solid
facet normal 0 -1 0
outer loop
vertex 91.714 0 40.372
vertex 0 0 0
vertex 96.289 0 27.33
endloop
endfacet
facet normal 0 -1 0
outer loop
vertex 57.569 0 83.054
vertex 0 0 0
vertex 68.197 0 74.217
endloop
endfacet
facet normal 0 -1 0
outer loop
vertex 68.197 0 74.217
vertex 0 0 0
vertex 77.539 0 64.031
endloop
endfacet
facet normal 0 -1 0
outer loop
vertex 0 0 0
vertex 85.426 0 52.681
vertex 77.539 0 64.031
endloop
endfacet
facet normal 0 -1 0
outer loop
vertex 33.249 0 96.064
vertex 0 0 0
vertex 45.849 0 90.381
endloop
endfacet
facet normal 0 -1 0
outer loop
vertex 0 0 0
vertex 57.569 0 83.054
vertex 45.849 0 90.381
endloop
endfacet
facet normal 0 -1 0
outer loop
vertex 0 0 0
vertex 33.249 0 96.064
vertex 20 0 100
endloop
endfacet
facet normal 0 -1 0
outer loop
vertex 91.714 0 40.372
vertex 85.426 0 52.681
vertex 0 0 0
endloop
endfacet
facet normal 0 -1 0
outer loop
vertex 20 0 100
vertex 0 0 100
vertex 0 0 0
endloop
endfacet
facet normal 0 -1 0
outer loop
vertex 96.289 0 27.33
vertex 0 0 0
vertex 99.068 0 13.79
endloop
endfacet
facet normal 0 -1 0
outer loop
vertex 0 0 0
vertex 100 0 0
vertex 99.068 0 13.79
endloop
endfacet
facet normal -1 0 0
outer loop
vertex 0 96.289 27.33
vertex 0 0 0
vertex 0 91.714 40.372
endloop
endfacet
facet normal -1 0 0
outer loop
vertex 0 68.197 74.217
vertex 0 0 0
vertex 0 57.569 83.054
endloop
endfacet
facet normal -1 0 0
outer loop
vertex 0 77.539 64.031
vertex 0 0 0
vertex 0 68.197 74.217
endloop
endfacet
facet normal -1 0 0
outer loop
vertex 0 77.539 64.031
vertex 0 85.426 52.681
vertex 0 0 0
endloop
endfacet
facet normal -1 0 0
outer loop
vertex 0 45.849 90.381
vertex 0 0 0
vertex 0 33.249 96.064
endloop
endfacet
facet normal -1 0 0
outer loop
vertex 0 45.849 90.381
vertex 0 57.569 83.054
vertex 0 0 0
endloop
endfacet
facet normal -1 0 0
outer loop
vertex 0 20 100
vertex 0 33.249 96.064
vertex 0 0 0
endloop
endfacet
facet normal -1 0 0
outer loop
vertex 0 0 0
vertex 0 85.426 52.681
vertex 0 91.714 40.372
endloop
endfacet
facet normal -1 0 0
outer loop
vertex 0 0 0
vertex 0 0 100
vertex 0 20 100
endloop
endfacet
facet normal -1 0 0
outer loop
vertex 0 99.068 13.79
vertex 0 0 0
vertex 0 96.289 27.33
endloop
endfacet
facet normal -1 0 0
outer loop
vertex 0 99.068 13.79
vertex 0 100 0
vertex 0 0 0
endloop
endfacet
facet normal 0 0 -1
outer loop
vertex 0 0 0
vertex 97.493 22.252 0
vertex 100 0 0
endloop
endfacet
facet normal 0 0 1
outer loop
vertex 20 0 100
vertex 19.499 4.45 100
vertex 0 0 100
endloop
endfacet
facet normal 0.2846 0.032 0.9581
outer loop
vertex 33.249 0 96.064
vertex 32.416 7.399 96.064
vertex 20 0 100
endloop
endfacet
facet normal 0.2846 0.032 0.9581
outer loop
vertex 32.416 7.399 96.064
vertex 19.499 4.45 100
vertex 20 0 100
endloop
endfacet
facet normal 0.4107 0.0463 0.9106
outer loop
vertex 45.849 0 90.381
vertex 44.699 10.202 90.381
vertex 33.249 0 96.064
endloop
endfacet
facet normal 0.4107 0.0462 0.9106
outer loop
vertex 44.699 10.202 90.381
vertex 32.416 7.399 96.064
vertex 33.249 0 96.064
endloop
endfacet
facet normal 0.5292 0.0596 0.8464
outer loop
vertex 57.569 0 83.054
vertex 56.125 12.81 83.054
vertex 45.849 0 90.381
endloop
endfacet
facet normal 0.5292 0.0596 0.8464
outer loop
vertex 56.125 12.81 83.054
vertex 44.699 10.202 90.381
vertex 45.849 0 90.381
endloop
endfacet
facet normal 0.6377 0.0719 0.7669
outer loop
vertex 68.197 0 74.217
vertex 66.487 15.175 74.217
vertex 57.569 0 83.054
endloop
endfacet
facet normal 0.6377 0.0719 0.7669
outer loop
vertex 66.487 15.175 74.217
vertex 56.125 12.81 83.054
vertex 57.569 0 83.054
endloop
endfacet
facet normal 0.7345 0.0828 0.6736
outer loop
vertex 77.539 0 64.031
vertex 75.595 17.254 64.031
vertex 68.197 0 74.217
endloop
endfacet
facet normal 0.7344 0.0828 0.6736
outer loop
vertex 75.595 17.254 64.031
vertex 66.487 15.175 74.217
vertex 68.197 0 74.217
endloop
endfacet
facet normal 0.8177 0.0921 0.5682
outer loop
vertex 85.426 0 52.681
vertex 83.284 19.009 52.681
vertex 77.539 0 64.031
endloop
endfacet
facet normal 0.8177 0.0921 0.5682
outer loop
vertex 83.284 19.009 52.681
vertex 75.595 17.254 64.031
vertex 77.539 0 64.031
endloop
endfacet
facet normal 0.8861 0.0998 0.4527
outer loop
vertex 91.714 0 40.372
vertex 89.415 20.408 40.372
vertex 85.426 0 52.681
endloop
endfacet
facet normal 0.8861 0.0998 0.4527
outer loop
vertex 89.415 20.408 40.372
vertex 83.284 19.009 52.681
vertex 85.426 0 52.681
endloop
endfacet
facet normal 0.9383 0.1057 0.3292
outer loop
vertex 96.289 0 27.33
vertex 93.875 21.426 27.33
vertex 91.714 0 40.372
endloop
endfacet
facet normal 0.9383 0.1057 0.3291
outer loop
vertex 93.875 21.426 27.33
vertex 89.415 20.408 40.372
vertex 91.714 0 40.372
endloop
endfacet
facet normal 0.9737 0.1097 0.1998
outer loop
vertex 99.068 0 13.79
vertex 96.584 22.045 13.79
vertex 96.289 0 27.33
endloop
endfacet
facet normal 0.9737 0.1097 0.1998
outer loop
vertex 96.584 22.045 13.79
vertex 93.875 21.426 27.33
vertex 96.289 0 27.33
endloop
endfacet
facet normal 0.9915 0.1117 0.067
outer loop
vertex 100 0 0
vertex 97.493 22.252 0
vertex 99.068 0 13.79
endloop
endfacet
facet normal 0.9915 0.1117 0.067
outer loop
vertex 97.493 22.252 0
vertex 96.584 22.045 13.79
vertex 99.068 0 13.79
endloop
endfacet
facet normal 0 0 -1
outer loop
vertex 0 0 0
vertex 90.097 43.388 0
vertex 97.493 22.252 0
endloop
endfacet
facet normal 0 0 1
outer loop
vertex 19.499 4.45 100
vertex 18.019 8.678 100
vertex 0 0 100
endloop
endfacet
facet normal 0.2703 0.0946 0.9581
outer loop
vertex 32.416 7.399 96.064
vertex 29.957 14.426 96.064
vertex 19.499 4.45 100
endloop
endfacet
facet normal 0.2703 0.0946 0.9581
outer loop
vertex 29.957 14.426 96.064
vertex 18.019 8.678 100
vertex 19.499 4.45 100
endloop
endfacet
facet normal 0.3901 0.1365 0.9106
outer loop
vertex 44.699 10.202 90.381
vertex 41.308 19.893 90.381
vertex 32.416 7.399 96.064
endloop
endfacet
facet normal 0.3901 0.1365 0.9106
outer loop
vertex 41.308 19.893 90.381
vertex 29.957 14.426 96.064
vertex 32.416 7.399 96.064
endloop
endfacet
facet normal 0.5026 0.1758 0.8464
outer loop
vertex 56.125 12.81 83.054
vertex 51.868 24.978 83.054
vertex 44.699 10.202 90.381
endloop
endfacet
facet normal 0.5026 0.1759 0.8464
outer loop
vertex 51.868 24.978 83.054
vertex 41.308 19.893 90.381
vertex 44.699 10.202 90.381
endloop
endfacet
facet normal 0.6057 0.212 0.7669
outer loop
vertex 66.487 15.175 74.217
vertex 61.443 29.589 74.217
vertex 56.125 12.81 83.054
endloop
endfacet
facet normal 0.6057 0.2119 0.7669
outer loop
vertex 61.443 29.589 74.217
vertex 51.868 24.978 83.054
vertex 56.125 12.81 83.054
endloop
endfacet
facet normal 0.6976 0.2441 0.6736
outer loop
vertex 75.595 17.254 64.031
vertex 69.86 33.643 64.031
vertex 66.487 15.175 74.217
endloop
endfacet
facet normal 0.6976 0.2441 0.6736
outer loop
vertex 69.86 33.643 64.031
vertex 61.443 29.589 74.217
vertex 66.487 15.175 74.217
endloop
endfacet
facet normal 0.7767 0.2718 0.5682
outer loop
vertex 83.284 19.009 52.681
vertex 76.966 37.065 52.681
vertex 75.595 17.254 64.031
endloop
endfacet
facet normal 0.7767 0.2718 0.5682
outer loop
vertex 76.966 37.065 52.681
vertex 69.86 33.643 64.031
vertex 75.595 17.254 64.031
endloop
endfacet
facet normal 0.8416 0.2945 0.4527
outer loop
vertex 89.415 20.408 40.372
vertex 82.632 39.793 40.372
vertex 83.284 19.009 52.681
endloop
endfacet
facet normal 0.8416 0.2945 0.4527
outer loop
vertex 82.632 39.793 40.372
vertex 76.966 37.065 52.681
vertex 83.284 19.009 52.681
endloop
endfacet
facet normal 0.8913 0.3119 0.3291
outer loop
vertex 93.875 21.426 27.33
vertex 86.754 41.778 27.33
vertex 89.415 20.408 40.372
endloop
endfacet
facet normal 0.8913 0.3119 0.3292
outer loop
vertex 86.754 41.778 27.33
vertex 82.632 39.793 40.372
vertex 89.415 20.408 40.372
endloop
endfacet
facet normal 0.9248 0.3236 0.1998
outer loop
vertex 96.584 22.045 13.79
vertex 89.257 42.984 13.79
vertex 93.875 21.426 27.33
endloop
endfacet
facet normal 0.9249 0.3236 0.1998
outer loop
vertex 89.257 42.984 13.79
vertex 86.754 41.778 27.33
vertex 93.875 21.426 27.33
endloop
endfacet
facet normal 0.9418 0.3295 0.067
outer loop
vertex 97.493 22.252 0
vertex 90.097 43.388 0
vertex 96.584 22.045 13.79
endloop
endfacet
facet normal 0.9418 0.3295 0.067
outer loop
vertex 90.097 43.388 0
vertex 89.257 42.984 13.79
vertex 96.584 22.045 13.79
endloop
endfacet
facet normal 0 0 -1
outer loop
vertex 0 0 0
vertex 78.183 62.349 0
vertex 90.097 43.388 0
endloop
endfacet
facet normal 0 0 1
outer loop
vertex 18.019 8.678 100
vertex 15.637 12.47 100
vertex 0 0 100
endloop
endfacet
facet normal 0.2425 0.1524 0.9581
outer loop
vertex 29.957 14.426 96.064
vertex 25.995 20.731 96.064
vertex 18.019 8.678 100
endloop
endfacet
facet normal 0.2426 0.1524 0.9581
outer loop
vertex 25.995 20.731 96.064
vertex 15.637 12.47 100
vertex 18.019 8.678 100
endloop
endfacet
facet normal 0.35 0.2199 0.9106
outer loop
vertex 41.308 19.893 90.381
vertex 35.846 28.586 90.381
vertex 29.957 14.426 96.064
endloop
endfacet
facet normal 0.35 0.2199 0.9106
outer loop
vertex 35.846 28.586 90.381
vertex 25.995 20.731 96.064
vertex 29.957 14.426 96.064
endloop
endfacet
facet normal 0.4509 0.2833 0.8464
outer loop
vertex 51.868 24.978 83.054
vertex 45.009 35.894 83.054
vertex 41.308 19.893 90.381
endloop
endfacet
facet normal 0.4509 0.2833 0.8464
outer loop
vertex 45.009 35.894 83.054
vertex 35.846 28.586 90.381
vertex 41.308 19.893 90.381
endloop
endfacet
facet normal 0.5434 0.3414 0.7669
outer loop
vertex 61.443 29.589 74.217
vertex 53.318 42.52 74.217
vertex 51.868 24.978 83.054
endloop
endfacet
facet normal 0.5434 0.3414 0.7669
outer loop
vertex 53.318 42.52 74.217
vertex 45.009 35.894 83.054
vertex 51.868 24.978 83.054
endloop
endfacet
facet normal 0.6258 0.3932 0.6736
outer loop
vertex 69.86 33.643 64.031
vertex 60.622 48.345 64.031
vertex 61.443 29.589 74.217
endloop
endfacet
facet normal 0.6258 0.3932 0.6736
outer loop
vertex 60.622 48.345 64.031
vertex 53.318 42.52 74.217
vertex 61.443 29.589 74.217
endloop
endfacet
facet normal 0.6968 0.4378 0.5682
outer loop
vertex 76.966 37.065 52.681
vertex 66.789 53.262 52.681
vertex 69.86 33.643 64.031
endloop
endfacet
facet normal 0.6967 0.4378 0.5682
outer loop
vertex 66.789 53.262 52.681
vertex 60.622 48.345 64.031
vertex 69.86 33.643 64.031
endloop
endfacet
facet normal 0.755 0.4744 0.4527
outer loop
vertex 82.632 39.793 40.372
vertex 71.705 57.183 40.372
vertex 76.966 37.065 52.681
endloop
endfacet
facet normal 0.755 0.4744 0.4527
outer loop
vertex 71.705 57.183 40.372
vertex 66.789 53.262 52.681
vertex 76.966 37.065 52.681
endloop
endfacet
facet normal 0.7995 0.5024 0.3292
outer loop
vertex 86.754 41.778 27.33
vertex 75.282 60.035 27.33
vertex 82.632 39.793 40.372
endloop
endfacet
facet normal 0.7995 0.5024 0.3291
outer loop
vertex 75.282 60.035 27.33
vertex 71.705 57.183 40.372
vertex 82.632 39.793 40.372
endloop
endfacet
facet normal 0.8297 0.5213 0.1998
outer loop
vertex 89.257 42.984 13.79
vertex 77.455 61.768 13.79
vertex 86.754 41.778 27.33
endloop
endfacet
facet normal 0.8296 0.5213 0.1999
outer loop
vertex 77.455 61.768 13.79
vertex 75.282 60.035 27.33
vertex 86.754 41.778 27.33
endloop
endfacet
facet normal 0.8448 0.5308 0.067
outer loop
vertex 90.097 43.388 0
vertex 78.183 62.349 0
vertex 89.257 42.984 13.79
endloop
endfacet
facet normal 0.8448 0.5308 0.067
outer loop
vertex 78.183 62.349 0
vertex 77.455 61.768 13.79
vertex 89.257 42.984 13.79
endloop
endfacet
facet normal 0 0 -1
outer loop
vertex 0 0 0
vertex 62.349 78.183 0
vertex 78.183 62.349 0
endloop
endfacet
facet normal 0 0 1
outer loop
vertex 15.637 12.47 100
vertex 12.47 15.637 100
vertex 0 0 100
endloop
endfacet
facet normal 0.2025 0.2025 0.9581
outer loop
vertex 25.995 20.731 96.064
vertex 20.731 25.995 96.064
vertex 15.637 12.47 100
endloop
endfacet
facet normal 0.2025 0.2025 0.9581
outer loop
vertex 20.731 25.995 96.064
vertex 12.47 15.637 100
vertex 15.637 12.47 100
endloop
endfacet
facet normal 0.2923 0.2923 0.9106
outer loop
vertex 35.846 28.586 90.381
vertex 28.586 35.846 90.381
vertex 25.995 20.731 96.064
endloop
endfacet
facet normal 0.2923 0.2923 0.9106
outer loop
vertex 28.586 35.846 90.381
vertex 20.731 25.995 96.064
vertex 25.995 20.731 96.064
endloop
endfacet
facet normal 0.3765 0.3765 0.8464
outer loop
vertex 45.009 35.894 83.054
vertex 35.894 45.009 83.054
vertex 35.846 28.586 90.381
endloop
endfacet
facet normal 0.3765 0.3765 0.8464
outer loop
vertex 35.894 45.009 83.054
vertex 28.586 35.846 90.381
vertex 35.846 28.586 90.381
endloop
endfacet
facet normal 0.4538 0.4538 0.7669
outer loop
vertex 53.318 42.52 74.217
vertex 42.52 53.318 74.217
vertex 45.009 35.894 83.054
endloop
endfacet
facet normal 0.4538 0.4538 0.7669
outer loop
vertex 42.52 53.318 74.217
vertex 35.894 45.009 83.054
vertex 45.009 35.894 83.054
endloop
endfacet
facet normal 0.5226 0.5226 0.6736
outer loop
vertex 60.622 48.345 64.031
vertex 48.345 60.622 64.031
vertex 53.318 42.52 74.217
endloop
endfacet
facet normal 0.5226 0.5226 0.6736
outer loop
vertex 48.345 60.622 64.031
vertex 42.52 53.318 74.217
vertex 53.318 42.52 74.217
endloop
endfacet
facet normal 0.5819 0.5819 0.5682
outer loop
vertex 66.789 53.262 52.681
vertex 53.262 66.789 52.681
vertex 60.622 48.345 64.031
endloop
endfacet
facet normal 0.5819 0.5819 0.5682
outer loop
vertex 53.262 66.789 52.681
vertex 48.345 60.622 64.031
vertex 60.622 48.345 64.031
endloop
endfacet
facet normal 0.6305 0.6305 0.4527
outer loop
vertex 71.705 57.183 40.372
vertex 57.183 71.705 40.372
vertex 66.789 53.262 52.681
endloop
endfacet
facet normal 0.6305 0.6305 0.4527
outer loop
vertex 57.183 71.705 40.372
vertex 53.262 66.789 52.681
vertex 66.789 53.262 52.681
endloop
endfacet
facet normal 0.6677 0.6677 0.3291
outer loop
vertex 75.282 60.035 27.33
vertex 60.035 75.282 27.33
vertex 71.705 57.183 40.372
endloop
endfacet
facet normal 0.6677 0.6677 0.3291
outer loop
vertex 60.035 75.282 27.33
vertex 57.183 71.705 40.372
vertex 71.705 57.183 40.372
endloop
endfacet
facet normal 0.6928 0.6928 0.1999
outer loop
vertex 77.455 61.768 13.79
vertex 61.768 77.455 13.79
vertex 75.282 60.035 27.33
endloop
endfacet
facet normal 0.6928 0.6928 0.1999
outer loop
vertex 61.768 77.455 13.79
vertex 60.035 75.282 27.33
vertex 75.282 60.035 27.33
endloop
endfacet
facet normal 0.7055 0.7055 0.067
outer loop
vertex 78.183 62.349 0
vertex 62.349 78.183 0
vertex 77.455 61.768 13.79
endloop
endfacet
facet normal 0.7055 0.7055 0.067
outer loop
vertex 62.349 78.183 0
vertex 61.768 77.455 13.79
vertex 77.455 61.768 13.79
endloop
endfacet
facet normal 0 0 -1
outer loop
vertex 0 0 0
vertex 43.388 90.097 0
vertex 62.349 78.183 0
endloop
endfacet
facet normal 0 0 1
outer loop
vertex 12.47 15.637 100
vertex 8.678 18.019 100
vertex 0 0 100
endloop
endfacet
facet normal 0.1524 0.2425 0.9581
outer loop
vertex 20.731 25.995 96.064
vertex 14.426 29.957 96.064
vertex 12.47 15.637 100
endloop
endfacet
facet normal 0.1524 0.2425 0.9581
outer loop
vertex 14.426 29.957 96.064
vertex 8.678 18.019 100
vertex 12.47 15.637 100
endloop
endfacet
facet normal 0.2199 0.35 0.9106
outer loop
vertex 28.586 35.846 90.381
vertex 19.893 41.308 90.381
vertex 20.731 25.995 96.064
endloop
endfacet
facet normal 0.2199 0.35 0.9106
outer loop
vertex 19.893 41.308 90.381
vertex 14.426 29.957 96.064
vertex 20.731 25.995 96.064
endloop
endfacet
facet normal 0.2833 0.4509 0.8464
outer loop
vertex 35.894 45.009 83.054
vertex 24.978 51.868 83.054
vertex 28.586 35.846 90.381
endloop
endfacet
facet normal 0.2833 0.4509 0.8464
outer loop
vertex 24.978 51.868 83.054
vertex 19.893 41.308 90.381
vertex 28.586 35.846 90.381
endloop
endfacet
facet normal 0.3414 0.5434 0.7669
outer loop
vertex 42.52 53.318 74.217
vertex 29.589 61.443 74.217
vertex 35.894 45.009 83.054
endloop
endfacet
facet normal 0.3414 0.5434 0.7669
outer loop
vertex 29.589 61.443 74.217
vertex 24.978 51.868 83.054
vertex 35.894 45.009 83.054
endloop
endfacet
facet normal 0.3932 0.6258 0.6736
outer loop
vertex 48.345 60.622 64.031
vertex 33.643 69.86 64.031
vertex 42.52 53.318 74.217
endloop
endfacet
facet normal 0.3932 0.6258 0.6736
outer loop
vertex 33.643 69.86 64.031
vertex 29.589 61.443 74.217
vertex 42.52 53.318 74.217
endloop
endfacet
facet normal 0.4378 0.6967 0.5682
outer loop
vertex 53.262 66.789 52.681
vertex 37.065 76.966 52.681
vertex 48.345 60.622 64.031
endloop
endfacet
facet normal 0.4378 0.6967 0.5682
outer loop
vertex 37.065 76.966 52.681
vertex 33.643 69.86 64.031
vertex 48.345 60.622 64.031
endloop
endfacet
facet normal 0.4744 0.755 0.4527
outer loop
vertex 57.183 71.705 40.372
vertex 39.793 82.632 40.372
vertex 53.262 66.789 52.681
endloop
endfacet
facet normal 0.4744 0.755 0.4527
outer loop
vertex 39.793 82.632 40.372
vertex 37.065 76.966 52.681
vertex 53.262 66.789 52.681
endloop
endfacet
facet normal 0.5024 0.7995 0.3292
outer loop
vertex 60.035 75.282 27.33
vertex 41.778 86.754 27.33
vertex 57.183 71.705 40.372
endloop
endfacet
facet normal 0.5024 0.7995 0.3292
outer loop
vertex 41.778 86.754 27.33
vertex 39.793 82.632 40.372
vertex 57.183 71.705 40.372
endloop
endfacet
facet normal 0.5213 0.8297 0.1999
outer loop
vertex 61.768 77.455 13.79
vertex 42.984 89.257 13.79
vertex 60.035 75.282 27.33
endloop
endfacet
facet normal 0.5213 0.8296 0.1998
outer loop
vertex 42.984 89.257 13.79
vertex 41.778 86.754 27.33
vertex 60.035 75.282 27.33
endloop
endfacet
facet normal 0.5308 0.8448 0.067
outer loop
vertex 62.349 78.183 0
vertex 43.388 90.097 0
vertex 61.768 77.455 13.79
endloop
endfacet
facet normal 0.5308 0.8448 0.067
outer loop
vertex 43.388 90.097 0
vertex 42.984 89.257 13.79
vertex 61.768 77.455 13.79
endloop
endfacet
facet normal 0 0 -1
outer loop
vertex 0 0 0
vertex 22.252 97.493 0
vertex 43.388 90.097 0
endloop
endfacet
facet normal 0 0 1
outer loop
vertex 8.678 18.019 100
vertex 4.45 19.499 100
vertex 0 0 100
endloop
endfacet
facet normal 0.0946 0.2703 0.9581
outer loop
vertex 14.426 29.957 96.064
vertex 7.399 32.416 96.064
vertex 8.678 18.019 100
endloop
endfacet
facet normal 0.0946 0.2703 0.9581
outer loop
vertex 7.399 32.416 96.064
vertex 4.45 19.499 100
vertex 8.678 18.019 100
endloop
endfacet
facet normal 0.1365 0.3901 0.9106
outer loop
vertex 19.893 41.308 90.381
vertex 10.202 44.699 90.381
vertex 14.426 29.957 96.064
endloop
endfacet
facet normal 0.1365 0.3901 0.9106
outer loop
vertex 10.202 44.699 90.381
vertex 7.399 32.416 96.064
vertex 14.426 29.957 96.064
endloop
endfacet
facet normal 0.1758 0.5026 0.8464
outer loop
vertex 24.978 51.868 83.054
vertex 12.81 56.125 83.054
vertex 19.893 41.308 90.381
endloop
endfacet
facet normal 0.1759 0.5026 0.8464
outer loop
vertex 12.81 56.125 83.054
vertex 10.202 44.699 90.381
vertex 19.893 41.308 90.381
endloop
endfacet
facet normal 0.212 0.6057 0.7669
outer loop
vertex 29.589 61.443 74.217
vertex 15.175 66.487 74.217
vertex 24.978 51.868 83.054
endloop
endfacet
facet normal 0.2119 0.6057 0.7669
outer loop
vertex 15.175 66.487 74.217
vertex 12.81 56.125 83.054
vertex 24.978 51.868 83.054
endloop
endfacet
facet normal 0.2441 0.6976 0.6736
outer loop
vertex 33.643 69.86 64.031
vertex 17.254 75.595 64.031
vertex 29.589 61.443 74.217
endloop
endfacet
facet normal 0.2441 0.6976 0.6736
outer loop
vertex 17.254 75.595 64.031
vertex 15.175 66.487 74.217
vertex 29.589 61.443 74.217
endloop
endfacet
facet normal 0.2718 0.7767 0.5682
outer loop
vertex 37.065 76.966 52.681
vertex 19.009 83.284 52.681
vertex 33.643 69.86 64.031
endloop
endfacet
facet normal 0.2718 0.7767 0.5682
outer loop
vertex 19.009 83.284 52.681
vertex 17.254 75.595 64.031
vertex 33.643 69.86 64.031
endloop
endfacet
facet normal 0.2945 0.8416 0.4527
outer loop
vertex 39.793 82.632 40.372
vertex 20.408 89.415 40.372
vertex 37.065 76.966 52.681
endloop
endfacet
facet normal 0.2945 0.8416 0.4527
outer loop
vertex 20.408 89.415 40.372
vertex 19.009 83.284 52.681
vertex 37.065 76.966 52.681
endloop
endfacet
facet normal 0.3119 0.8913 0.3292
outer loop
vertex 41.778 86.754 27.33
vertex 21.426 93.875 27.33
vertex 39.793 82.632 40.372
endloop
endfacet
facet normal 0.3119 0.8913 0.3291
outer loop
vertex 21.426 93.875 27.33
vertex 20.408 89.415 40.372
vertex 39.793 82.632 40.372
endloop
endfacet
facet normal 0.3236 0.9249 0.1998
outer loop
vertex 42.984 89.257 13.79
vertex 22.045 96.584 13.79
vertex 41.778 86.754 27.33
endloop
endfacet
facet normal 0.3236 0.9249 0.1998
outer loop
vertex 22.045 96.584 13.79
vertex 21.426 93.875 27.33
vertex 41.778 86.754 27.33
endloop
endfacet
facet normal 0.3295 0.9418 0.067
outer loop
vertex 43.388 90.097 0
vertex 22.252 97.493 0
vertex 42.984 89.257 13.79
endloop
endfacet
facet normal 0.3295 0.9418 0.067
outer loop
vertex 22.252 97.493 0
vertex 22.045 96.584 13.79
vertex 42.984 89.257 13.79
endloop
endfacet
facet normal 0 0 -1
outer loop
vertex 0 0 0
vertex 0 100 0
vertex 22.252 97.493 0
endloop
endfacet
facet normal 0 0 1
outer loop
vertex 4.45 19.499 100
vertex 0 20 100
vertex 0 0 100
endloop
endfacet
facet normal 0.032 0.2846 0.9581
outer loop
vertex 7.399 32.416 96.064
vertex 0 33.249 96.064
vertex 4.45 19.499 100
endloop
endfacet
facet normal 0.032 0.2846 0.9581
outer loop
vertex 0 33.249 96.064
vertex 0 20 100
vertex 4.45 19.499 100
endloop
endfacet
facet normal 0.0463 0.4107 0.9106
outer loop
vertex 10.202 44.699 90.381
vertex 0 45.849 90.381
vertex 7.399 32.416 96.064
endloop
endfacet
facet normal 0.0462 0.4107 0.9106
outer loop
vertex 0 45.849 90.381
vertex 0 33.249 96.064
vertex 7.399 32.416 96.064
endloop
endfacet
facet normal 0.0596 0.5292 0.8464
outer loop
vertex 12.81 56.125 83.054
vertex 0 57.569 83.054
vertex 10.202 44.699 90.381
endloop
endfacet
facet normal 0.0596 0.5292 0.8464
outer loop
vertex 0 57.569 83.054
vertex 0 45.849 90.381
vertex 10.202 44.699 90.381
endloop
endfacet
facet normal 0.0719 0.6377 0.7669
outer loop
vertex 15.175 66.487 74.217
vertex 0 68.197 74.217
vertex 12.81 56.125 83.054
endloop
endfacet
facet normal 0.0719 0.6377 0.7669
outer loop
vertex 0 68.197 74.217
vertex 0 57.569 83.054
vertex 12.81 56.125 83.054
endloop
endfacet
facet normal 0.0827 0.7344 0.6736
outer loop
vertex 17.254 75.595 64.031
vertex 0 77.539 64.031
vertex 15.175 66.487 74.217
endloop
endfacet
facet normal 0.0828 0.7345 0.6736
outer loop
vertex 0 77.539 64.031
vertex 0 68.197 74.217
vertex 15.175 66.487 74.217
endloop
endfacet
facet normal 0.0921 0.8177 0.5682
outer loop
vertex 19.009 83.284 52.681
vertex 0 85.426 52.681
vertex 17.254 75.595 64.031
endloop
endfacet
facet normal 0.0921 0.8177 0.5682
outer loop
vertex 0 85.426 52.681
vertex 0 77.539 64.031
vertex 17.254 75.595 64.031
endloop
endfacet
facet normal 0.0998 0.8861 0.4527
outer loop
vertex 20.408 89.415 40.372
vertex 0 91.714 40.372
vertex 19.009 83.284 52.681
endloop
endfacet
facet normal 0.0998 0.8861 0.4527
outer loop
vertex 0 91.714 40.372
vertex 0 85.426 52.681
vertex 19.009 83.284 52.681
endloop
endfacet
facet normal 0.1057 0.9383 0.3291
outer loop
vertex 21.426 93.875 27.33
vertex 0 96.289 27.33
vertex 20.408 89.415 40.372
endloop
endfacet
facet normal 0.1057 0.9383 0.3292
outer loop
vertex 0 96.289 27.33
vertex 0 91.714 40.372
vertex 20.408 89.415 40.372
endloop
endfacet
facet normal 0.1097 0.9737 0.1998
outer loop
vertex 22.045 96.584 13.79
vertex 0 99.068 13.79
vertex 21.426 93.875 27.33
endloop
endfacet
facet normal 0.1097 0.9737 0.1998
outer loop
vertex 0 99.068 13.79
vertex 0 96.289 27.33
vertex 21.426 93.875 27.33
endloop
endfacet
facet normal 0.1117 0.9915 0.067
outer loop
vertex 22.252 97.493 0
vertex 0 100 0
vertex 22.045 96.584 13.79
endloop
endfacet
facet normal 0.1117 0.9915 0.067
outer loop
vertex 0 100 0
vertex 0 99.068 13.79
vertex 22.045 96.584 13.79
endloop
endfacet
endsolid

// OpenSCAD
// Start: lazy_union
default_5_default_5();
// End: lazy_union

// Modules.

// 'PartMaterial undef-default - undef-default'
module default_5_default_5() {
  // 'None : _combine_solids_and_holes'
  union() {
    rotate_extrude(angle=90.0, convexity=10) {
      polygon(points=[[0.0, 0.0], [100.0, 0.0], [99.06810107880757, 13.79024449548039], [96.28934940009508, 27.329735547676524], [91.71427209930943, 40.372279261855994], [85.4260596076891, 52.6807179323242], [77.5390529679106, 64.03124237432849], [68.19666472590659, 74.21746153455233], [57.56877120409817, 83.05415538087006], [45.84862357336381, 90.38064283109061], [33.24933389093864, 96.06370348031658], [20.000000000000007, 100.0], [0.0, 100.0]]);
    }
  }
} // end module default_5_default_5
